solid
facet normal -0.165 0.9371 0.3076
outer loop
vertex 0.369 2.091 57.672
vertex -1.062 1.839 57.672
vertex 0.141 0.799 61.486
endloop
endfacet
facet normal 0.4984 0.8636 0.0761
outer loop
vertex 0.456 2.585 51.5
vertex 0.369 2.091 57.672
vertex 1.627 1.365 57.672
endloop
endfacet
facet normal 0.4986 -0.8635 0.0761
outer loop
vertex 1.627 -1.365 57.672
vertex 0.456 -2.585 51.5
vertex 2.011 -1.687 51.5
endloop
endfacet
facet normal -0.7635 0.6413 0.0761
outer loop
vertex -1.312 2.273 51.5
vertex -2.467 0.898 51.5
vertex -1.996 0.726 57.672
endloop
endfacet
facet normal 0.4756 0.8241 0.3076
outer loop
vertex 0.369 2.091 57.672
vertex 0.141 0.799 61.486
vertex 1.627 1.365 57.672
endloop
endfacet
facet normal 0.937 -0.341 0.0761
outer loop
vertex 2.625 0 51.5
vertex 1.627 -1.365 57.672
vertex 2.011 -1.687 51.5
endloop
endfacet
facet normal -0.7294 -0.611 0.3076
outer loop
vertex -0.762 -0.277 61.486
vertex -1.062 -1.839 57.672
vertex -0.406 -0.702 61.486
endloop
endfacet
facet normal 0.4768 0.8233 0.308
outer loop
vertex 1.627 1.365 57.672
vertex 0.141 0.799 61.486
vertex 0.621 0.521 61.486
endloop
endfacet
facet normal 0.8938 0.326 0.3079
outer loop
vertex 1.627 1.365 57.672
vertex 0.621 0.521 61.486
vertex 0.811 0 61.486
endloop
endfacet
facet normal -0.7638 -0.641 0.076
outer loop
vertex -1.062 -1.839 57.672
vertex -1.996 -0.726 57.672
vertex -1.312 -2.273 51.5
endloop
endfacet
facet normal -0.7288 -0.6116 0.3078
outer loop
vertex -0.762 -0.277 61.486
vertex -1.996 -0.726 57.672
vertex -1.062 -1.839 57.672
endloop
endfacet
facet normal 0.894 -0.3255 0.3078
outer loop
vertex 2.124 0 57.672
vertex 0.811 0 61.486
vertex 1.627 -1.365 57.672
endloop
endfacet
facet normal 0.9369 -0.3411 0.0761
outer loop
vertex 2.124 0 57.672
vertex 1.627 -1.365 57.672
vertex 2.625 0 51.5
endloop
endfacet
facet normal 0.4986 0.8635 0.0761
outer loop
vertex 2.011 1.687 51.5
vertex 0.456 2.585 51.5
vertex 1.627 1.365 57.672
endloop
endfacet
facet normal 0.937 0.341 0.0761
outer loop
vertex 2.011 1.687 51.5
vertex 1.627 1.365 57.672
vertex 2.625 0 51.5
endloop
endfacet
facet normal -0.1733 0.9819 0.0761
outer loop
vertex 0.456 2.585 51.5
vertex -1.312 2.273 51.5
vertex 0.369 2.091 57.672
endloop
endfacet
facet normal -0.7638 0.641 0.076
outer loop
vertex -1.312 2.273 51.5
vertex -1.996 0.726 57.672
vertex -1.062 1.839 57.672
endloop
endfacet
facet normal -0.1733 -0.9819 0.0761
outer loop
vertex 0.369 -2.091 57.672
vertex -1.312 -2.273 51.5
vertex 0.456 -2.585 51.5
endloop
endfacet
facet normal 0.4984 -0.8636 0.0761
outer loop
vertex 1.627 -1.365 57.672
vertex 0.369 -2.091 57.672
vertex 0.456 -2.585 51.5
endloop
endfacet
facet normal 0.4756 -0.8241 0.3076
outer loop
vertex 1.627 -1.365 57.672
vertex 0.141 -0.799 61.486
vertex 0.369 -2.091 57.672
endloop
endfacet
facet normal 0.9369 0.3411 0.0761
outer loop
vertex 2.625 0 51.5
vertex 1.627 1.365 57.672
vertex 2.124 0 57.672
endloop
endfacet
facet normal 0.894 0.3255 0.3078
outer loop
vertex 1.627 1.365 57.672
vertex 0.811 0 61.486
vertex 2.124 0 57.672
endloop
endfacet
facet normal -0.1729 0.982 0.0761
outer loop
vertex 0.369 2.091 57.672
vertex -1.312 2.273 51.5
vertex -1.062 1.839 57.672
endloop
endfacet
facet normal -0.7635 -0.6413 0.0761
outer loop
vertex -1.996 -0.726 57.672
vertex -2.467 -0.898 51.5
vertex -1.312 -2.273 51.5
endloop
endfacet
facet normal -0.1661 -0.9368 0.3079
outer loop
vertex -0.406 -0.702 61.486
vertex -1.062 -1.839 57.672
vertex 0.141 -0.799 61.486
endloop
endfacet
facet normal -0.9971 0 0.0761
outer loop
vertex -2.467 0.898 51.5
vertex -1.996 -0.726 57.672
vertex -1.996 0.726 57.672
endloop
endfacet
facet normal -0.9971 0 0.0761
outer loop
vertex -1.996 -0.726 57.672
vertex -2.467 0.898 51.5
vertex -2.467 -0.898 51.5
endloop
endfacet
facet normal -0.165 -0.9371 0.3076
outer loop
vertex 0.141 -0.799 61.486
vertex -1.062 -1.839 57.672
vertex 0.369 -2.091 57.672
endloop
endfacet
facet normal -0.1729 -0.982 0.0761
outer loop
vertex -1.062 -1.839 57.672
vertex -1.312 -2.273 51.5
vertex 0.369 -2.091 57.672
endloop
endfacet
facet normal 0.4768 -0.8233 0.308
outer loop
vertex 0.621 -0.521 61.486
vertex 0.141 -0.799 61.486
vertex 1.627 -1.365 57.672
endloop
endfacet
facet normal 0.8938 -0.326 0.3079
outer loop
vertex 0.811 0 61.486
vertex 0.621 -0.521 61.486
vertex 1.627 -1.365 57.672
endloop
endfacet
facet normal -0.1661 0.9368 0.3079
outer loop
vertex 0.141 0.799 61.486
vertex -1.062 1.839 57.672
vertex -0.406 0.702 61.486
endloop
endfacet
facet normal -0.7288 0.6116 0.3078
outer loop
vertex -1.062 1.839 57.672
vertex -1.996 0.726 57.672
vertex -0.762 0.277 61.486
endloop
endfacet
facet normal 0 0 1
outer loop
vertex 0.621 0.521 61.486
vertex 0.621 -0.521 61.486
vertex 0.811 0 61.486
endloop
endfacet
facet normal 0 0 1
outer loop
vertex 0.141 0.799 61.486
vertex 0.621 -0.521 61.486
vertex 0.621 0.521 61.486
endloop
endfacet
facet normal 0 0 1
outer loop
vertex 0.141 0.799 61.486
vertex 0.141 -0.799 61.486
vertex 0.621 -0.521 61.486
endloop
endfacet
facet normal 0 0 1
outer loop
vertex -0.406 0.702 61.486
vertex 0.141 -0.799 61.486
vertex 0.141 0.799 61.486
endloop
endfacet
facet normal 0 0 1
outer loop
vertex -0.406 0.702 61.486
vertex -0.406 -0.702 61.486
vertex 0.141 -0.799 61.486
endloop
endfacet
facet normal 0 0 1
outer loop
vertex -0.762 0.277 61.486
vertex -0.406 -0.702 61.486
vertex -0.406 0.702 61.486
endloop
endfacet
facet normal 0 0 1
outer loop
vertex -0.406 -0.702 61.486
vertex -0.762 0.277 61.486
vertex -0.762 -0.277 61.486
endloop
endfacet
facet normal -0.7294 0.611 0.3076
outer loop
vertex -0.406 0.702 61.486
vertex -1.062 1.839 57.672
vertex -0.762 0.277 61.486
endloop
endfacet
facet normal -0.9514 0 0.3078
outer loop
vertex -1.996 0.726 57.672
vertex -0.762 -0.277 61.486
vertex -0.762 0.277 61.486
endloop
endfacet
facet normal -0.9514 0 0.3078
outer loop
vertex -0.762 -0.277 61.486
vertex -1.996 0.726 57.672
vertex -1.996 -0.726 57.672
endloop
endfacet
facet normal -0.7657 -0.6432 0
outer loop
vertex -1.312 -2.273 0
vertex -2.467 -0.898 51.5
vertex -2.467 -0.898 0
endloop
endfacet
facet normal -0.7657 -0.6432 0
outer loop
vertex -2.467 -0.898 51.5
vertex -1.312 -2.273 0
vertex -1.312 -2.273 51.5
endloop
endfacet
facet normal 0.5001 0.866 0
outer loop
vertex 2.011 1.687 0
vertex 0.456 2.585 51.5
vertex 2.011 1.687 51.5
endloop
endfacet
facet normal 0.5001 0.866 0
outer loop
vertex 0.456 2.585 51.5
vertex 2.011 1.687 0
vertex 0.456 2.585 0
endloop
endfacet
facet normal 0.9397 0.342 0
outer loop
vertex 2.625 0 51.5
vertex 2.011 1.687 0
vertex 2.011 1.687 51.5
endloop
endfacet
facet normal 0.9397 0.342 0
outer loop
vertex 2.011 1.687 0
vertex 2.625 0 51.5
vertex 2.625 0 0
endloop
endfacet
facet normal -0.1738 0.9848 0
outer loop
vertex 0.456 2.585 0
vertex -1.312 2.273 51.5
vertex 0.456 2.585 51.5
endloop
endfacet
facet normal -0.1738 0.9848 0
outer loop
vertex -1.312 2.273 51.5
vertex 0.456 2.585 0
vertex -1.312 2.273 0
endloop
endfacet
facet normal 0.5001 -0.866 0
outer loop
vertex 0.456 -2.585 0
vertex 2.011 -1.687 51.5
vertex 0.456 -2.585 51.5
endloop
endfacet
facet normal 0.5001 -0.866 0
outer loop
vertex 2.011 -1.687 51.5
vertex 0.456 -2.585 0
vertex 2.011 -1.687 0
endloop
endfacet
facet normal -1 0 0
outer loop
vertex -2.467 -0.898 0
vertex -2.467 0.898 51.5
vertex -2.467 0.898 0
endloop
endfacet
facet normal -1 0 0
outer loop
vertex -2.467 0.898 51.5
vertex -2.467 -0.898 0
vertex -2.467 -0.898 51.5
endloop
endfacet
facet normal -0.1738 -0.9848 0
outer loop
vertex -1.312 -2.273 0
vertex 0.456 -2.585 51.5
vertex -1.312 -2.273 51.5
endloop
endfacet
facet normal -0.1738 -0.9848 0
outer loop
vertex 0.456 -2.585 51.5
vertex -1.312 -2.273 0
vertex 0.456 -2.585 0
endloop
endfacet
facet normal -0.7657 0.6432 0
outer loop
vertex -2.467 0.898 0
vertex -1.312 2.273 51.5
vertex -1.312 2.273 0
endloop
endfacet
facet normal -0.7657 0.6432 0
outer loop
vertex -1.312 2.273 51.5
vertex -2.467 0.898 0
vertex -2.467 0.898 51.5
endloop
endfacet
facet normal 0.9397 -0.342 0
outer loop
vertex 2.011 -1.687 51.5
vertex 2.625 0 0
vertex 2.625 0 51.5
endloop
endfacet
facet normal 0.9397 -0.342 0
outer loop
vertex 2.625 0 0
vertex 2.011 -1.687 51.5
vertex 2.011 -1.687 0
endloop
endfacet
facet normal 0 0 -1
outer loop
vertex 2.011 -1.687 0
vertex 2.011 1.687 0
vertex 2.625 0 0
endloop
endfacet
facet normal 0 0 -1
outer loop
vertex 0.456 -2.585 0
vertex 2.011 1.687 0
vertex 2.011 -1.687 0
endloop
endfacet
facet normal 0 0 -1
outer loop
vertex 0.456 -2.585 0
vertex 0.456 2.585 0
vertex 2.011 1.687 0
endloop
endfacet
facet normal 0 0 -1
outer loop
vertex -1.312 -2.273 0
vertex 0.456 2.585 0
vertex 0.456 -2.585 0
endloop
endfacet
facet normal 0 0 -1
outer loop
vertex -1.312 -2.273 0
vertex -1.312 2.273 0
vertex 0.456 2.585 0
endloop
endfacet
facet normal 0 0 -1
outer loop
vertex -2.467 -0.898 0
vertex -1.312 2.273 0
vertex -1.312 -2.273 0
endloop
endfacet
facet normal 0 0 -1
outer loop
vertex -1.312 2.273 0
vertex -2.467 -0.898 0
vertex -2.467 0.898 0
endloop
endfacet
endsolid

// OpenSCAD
//Enter total height of rocket MM.
height = 62;

// Enable tail fins. If enabled, the rocket will be wider and will not fit in the pod.
fins = 0; // [0,2,3,4,5]

//Enter total width/diameter of rocket POD (not the rocket itself) in MM. Actual width = (width-2)/4-1
width = 27;

w = (width-2)/4-1;
h = height;
f = fins;

module fin()
{
	difference()
	{
		cylinder(r=w/2, h = w);
		translate([0,0,-0.01])cylinder(r=w/2-1, h = w +0.02);
		translate([-w/2,0,-0.01]) cube(w + 0.02);
	}
}

translate([0,0,h-w/2*4])scale([1,1,4])sphere(w/2);
difference()
{
	cylinder(r=w/2, h=h-w/2*4);
	if (f != 0)
	{	
		translate([0,0,-0.1]) difference()
		{
			cylinder(r=w/2+0.05, h = w + 0.1);
			cylinder(r=w/2-1, h = w + 0.1);
		}
	}
}

if (f != 0)
{
for (i= [360/f:360/f:360] )
	rotate([0,0,i])translate([w-2.51,0,0])
		rotate([0,0,25])fin();

}
